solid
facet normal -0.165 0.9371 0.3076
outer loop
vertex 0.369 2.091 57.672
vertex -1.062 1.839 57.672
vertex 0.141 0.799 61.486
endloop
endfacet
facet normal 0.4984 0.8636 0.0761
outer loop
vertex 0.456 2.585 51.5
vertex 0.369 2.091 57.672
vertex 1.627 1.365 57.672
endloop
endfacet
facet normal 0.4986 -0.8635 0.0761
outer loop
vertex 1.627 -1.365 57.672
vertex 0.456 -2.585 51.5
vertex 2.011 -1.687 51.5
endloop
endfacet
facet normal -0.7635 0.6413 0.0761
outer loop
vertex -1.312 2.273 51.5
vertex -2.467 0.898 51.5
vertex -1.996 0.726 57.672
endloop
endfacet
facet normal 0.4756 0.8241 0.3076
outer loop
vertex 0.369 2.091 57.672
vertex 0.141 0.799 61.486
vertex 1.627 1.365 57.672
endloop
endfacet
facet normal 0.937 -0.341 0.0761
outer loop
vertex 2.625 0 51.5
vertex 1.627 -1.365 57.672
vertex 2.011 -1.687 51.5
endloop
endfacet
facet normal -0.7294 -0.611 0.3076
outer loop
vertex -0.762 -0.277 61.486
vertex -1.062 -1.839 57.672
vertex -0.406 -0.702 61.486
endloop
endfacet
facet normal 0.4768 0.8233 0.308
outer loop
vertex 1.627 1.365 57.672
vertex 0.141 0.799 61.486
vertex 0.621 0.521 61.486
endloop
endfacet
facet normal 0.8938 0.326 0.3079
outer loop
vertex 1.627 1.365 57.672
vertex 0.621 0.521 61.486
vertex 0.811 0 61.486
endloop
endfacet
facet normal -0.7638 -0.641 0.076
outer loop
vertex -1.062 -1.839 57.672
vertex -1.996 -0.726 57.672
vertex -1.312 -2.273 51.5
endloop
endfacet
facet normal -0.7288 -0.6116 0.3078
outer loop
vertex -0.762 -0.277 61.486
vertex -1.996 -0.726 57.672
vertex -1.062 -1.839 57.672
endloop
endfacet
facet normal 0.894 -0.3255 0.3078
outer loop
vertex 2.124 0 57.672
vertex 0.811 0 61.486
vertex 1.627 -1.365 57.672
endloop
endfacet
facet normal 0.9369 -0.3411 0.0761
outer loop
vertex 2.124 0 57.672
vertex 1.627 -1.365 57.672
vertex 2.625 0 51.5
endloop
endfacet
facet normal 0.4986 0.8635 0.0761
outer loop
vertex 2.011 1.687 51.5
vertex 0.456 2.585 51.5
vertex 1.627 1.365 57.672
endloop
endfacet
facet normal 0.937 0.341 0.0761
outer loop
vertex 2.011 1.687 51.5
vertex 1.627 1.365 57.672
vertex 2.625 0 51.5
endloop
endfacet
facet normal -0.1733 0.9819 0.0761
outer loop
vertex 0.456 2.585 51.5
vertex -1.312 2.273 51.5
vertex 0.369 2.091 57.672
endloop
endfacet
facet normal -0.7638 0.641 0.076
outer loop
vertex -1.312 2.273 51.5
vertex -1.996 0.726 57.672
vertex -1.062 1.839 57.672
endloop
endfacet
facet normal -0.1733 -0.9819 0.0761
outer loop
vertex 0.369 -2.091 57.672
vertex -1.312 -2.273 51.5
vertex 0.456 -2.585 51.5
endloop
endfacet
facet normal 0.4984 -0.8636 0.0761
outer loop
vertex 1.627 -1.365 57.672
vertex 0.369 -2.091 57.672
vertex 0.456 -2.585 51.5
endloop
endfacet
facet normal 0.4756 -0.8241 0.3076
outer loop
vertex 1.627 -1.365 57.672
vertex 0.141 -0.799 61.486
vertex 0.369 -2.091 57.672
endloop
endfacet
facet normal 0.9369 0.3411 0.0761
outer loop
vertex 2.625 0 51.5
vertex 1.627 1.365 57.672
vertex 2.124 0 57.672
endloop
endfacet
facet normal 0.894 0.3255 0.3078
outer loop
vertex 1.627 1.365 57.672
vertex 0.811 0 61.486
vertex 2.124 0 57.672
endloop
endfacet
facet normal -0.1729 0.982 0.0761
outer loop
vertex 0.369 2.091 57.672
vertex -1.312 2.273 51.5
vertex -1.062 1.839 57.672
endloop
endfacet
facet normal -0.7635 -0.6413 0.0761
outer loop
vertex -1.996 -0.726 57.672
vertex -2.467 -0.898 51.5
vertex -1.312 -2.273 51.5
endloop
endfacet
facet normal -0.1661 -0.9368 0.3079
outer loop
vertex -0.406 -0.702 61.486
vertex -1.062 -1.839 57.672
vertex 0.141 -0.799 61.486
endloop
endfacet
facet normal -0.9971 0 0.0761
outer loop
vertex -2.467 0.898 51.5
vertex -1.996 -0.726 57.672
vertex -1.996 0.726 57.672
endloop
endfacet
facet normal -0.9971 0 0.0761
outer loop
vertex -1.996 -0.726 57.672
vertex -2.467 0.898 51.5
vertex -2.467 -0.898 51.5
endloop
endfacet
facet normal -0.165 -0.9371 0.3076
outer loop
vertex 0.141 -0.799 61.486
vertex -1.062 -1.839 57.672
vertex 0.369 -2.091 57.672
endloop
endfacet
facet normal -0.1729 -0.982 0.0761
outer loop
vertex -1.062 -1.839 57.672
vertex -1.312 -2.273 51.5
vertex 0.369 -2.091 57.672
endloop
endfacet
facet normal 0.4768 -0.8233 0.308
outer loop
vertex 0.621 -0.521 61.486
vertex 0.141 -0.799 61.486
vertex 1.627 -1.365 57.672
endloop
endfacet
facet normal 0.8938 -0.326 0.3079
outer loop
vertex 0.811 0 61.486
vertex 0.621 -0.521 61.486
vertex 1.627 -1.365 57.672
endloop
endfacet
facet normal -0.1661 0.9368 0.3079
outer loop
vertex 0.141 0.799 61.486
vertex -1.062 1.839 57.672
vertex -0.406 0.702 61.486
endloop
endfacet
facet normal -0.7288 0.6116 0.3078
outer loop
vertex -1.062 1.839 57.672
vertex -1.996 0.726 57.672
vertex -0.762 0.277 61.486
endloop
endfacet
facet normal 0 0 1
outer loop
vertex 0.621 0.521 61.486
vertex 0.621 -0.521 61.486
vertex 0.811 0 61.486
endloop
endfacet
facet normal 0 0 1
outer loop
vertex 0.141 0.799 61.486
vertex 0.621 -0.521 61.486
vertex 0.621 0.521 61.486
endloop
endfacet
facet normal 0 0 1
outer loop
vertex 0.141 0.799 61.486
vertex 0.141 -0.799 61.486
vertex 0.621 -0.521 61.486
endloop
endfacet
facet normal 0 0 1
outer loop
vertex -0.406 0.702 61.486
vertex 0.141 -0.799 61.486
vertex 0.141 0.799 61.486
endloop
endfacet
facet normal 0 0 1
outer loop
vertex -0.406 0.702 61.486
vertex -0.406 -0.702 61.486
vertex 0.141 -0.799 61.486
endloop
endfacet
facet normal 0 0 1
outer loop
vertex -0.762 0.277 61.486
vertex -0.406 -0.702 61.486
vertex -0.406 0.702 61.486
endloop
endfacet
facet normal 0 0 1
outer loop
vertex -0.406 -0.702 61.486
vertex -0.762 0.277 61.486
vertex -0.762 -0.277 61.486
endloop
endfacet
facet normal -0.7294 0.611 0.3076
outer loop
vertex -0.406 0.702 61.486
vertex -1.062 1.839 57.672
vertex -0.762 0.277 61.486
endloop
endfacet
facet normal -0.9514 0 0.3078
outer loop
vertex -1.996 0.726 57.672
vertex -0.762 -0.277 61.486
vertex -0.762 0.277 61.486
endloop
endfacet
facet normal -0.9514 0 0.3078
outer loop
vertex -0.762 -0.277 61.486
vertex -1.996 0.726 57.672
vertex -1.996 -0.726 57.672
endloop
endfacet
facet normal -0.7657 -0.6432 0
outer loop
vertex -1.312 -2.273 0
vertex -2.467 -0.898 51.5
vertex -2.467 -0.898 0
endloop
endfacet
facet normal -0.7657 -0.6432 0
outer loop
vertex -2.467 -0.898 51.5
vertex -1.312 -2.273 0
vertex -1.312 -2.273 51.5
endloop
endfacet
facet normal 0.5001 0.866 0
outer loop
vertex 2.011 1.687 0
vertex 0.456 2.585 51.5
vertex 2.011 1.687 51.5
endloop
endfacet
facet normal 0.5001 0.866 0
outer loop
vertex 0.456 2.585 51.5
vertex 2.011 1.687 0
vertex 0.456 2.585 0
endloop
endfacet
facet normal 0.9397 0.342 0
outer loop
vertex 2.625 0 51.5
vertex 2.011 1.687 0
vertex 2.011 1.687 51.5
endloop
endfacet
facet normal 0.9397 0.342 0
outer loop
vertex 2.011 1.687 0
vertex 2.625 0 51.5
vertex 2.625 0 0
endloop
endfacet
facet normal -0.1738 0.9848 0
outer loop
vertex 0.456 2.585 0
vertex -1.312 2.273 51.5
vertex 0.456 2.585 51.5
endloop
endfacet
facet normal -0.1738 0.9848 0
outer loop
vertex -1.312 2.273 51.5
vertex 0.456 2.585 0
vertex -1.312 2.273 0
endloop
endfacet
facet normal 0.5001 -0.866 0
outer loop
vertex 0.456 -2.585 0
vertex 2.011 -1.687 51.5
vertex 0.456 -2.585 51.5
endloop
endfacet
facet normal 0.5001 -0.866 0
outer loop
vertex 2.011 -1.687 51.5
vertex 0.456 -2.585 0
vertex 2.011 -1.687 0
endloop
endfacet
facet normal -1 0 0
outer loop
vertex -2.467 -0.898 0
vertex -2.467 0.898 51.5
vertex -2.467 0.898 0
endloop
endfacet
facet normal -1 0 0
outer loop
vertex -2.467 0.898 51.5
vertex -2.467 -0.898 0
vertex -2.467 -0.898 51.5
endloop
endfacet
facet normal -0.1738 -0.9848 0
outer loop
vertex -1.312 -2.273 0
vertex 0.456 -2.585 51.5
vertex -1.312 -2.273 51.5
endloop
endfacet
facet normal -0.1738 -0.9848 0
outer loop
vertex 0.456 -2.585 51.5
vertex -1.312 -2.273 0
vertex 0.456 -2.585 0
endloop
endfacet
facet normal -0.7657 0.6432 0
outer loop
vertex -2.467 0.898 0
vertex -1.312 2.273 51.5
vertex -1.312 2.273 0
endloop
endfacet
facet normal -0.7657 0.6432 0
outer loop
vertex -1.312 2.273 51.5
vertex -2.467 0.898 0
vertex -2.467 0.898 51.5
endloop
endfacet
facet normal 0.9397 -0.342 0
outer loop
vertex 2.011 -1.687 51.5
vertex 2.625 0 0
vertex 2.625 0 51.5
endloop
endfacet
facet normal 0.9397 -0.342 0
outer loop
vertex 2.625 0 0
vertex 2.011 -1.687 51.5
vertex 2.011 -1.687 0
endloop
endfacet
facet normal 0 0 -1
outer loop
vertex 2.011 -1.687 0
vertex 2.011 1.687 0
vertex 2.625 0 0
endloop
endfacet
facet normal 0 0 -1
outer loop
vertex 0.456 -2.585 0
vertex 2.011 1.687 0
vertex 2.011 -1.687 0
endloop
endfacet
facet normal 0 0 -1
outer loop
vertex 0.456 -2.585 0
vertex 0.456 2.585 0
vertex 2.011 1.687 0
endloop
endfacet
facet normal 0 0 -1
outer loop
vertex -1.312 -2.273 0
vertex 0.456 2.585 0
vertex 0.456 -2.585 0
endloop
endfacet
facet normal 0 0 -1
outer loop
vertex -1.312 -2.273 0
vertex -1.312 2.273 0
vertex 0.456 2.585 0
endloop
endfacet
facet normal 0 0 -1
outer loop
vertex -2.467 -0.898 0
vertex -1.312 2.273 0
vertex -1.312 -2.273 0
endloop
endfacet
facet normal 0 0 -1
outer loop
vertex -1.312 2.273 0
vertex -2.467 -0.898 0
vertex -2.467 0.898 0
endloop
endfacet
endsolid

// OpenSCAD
//Enter total height of rocket MM.
height = 62;

// Enable tail fins. If enabled, the rocket will be wider and will not fit in the pod.
fins = 0; // [0,2,3,4,5]

//Enter total width/diameter of rocket POD (not the rocket itself) in MM. Actual width = (width-2)/4-1
width = 27;

w = (width-2)/4-1;
h = height;
f = fins;

module fin()
{
	difference()
	{
		cylinder(r=w/2, h = w);
		translate([0,0,-0.01])cylinder(r=w/2-1, h = w +0.02);
		translate([-w/2,0,-0.01]) cube(w + 0.02);
	}
}

translate([0,0,h-w/2*4])scale([1,1,4])sphere(w/2);
difference()
{
	cylinder(r=w/2, h=h-w/2*4);
	if (f != 0)
	{	
		translate([0,0,-0.1]) difference()
		{
			cylinder(r=w/2+0.05, h = w + 0.1);
			cylinder(r=w/2-1, h = w + 0.1);
		}
	}
}

if (f != 0)
{
for (i= [360/f:360/f:360] )
	rotate([0,0,i])translate([w-2.51,0,0])
		rotate([0,0,25])fin();

}
